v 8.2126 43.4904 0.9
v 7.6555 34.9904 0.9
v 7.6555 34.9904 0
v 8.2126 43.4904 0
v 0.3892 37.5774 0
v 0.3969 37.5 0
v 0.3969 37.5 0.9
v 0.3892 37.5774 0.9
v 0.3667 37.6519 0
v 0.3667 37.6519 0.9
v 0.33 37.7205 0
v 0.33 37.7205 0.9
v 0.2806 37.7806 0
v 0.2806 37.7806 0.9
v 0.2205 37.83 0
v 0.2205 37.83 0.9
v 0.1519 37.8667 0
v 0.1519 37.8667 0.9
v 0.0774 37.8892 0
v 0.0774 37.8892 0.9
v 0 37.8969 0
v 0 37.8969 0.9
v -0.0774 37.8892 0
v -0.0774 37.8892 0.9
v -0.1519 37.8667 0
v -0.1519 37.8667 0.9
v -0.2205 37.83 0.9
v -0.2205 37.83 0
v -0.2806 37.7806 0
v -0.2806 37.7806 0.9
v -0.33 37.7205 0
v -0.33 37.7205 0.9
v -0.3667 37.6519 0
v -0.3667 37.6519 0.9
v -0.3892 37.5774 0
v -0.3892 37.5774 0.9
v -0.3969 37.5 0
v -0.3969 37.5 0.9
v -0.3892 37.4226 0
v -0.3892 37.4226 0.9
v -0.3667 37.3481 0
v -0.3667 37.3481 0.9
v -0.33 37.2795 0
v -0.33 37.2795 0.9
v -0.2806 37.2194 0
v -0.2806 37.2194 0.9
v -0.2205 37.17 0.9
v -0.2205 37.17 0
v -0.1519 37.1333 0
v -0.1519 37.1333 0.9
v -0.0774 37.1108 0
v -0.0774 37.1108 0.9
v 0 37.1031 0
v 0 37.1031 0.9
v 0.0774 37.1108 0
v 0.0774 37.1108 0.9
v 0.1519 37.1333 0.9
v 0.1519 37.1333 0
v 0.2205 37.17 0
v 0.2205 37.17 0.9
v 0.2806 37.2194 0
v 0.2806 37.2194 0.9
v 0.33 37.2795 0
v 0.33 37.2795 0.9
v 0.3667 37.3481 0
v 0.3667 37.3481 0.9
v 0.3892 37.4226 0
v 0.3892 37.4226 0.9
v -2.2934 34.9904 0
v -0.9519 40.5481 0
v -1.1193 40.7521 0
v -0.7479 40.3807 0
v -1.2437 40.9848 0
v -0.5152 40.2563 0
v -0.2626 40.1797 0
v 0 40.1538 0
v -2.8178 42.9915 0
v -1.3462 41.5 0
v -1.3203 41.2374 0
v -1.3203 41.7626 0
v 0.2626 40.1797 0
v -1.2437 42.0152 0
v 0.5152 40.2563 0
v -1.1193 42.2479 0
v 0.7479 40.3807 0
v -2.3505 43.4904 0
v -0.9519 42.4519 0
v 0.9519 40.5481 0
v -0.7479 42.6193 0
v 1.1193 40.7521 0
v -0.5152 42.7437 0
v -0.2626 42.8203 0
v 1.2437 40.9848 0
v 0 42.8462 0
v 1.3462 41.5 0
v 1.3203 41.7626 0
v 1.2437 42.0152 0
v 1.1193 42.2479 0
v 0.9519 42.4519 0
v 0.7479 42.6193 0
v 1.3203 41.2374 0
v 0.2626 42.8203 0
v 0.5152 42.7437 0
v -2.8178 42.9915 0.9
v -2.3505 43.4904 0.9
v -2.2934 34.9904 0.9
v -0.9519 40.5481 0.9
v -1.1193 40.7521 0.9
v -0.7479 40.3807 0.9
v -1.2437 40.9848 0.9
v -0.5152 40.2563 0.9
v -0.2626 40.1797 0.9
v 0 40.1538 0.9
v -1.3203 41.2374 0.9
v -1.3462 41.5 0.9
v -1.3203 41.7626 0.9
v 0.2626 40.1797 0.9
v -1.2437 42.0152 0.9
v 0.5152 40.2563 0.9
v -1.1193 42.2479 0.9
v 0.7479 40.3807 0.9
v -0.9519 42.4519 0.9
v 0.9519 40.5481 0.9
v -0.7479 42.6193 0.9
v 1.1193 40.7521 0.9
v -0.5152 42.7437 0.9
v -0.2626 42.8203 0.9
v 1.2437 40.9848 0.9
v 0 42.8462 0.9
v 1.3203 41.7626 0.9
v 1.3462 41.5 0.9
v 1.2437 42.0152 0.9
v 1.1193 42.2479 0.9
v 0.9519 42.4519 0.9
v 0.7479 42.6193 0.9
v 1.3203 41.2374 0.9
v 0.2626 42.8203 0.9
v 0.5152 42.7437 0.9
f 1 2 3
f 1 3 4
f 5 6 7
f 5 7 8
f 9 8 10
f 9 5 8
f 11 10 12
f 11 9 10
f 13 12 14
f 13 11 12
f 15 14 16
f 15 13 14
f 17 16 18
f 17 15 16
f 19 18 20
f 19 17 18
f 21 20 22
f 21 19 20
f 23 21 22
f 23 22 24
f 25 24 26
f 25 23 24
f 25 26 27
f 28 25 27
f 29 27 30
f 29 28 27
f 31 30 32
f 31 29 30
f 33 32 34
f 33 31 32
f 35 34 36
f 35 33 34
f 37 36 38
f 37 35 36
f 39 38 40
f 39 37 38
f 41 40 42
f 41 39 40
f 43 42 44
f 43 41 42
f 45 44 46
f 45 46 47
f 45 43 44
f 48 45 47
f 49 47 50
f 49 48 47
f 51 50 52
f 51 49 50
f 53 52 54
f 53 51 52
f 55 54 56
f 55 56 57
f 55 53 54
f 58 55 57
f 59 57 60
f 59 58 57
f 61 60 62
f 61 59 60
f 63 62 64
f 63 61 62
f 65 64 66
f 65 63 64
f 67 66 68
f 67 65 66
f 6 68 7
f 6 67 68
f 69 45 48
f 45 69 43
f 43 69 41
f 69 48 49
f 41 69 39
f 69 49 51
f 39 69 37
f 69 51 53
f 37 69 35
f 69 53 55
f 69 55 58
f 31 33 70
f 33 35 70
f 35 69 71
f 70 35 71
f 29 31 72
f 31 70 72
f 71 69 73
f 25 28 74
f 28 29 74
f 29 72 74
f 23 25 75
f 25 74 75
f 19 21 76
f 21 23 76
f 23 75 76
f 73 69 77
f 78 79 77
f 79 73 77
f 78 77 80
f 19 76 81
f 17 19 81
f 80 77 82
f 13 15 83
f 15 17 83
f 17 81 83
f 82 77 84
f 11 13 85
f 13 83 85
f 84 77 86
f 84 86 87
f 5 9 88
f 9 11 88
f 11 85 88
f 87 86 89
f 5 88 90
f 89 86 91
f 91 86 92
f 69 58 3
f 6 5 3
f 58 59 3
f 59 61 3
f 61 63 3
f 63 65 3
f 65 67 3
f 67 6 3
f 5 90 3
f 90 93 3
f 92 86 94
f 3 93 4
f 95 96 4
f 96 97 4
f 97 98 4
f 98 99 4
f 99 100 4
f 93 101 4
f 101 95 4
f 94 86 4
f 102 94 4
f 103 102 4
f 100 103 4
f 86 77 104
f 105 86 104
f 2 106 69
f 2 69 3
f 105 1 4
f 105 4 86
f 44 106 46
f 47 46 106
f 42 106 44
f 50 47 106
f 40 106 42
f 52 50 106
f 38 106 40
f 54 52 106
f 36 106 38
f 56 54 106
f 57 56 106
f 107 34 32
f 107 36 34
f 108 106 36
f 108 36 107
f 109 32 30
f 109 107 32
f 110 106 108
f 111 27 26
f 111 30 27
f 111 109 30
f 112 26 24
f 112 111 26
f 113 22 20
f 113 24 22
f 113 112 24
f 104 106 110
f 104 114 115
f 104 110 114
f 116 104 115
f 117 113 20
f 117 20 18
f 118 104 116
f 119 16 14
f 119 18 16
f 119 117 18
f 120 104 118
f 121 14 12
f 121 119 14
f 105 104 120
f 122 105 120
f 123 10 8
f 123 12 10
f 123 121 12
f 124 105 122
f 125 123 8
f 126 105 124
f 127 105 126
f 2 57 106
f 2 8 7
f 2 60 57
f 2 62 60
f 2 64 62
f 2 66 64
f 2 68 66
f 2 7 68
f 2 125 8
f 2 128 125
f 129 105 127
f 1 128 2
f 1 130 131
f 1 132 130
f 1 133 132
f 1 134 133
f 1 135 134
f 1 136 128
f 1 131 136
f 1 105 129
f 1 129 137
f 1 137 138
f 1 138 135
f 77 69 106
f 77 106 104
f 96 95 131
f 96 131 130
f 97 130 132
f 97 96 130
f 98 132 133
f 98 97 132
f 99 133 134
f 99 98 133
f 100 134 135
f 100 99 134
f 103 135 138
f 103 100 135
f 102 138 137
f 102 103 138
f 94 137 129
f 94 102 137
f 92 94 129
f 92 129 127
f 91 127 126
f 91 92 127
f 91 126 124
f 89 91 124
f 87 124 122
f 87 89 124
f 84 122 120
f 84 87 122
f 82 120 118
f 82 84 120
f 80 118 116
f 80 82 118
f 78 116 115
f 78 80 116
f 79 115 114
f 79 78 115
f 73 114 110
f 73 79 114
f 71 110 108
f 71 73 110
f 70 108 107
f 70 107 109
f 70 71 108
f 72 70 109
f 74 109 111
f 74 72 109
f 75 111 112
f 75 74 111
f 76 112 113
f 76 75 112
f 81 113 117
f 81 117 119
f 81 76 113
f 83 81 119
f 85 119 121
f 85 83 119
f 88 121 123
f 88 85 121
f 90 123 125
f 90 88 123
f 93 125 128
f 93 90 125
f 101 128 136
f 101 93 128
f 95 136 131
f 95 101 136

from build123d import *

# Parameters (mm, degrees)
SKETCH1_R             = 0.396875
SKETCH1_R_2           = 1.3462
EXTRUDE1_DEPTH        = 0.9
CHAMFER1_SIZE         = 1.3
CHAMFER1_SIZE2        = 1.136906158
CHAMFER1_EDGE_2_SIZE  = 1.3
CHAMFER1_EDGE_2_SIZE2 = 1.136906158
SKETCH2_R             = 0.396875
SKETCH2_R_2           = 1.3462
EXTRUDE2_DEPTH        = 0.9
CUT_EXTRUDE2_DEPTH    = 1.9
CHAMFER2_SIZE         = 0.5


with BuildPart() as part:
    # Sketch1 → Extrude1 (new body)
    with BuildSketch(Plane.XY):
        Polygon((-2.158886106, 43.490401799), (2.158886106, 43.490401799), (0.81962306, 34.990401799), (-0.81962306, 34.990401799), align=None)
        with Locations((0, 37.5)):
            Circle(SKETCH1_R, mode=Mode.SUBTRACT)
        with Locations((0, 41.5)):
            Circle(SKETCH1_R_2, mode=Mode.SUBTRACT)
    extrude(amount=EXTRUDE1_DEPTH)

    # Chamfer1
    chamfer1_edges = [part.edges().sort_by_distance(p)[0] for p in [
        (-2.158886106, 43.490401799, 0.45),
    ]]
    chamfer1_side = [part.faces().sort_by_distance(p)[0] for p in [
        (0, 43.490401799, 0.45),
    ]]
    chamfer(chamfer1_edges, length=CHAMFER1_SIZE, length2=CHAMFER1_SIZE2, reference=chamfer1_side[0])

    # Chamfer1 edge 2
    chamfer1_edge_2_edges = [part.edges().sort_by_distance(p)[0] for p in [
        (2.158886106, 43.490401799, 0.45),
    ]]
    chamfer1_edge_2_side = [part.faces().sort_by_distance(p)[0] for p in [
        (0, 43.490401799, 0.45),
    ]]
    chamfer(chamfer1_edge_2_edges, length=CHAMFER1_EDGE_2_SIZE, length2=CHAMFER1_EDGE_2_SIZE2, reference=chamfer1_edge_2_side[0])

    # Sketch2 → Extrude2 (add)
    with BuildSketch(Plane(origin=(0, 0, 0.9), x_dir=(-1, 0, 0), z_dir=(0, 0, -1))):
        Polygon((-8.212619969, 43.490401799), (8.212619969, 43.490401799), (7.655500535, 34.990401799), (-7.655500535, 34.990401799), align=None)
        with Locations(Location((0, 37.5, 0), (0, 0, 180))):  # turned: the seam where the file's is
            Circle(SKETCH2_R, mode=Mode.SUBTRACT)
        with Locations(Location((0, 41.5, 0), (0, 0, 180))):  # turned: the seam where the file's is
            Circle(SKETCH2_R_2, mode=Mode.SUBTRACT)
    extrude(amount=EXTRUDE2_DEPTH)

    # Sketch4 → Cut-Extrude2 (cut, through all)
    with BuildSketch(Plane(origin=(0, 0, 0), x_dir=(-1, 0, 0), z_dir=(0, 0, -1))):
        Polygon((2.293392099, 34.990401799), (2.850511533, 43.490401799), (8.212619969, 43.490401799), (7.655500535, 34.990401799), align=None)
    extrude(amount=-CUT_EXTRUDE2_DEPTH, mode=Mode.SUBTRACT)

    # Chamfer2
    chamfer2_edges = [part.edges().sort_by_distance(p)[0] for p in [
        (-2.850511533, 43.490401799, 0.45),
    ]]
    chamfer(chamfer2_edges, length=CHAMFER2_SIZE)


solid = part.part
